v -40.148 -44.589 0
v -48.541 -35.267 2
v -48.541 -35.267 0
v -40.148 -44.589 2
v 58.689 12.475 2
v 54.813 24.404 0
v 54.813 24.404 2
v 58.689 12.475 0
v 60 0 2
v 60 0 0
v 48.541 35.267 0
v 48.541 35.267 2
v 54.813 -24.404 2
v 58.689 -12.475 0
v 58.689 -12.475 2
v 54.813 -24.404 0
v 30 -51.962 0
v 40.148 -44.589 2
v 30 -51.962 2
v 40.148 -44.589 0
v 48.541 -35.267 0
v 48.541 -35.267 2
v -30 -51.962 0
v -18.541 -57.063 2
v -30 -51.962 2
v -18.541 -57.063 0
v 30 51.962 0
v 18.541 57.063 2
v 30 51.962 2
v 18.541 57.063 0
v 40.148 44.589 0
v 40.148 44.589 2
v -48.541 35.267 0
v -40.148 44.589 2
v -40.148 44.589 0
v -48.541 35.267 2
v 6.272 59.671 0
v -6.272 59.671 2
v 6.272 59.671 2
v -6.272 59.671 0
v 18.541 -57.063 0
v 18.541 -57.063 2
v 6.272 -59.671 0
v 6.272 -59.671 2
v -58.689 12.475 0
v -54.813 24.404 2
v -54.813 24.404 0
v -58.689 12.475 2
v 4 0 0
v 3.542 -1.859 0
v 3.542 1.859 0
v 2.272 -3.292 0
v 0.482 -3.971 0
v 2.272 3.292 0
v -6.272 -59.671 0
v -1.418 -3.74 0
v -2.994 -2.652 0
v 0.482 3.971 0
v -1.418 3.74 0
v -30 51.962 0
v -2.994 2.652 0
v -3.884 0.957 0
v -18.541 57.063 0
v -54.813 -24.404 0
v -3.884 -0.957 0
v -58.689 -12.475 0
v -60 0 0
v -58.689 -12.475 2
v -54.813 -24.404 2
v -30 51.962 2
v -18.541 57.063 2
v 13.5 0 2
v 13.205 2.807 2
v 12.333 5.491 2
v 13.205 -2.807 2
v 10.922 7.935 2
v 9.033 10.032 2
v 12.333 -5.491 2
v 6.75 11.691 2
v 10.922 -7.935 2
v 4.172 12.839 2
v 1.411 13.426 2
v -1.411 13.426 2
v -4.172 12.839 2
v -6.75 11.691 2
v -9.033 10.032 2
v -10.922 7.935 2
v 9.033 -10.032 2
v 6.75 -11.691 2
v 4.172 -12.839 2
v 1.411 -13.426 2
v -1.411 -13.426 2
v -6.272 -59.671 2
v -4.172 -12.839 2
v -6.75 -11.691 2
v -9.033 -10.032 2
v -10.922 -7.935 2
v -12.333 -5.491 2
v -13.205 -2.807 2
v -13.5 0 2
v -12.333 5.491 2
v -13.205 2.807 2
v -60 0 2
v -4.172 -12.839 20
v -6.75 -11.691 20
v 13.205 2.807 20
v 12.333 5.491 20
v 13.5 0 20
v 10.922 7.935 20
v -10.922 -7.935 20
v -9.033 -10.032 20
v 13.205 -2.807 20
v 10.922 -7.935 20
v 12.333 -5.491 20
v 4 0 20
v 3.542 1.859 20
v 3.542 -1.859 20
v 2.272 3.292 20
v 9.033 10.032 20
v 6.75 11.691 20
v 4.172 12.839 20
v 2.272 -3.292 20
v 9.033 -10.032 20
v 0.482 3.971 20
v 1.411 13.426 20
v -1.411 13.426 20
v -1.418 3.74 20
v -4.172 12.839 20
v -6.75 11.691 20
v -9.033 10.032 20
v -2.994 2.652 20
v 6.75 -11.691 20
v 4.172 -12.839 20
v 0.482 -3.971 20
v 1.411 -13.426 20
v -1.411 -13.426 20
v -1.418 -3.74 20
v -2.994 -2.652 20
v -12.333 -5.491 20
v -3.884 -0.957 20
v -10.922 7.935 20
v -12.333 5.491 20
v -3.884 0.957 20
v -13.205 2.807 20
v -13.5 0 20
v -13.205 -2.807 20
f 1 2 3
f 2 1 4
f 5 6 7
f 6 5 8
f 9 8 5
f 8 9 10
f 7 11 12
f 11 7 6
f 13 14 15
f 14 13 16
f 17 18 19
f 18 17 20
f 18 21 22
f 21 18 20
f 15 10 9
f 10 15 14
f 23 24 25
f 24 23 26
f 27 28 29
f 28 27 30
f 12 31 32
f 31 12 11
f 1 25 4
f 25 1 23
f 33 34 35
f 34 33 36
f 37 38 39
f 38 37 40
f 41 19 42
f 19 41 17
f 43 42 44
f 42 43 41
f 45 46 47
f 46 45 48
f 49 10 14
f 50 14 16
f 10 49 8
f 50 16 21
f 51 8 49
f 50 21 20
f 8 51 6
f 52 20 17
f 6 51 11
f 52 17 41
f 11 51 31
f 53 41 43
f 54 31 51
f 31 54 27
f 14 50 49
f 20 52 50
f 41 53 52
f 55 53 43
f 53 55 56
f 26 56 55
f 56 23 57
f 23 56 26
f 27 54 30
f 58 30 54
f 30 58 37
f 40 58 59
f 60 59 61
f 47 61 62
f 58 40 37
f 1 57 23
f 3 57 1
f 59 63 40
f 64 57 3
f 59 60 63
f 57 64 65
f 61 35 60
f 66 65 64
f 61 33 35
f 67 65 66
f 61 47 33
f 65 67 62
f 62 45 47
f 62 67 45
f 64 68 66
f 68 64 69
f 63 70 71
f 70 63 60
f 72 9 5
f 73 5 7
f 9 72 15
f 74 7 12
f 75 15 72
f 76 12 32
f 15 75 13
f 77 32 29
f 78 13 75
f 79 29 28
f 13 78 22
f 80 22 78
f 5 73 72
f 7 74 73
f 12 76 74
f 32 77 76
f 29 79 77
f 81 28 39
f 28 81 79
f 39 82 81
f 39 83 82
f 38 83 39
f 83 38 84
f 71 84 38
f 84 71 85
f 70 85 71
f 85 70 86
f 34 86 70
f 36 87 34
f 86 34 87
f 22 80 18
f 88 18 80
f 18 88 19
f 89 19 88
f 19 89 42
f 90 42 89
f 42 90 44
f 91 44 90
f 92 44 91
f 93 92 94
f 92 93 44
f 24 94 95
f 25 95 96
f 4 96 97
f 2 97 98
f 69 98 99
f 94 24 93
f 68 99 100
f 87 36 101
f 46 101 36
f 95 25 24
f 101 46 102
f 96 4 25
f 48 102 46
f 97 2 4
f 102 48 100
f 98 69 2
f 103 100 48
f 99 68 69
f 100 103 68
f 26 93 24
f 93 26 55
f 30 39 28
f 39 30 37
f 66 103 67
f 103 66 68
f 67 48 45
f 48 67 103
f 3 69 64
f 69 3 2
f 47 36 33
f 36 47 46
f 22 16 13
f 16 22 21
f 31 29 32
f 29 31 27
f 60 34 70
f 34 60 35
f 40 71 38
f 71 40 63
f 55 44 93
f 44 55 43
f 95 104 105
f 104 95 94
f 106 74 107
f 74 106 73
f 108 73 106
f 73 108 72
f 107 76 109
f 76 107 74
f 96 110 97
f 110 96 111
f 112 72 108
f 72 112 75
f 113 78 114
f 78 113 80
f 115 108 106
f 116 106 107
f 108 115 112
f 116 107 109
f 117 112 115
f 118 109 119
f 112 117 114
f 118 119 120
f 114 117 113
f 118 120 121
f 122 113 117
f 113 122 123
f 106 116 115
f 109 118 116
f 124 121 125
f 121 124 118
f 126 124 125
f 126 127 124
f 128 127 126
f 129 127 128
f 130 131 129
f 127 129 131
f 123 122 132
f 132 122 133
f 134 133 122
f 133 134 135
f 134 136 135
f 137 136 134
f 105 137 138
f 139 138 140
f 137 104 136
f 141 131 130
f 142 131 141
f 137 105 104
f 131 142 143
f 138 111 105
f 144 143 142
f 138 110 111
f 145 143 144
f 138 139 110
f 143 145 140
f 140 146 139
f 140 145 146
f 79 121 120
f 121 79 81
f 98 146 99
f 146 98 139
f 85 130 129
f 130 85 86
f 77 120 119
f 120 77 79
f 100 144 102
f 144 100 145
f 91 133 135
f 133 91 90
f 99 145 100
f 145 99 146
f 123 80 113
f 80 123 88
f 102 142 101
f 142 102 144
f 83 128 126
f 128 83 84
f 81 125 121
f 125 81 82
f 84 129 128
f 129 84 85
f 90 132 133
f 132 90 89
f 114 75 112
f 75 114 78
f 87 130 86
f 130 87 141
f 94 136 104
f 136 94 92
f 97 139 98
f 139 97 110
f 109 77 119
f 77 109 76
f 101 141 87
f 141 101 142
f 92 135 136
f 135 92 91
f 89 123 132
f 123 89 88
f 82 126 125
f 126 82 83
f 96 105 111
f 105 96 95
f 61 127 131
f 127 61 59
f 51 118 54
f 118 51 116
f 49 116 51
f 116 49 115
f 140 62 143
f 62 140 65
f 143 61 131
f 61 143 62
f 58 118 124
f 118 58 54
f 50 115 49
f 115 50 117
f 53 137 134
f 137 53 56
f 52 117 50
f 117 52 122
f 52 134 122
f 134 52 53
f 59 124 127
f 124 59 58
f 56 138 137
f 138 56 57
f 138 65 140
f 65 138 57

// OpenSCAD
// globals
co_radius = 60;
co_height = 2;

module complexObject()
{
	difference()
	{
		union()
		{
			cylinder(r=co_radius, h=co_height);
			cylinder(r=13.5, h=20);
			{

			}
		}
		
		difference()
		{
			cylinder(r=4, h=20);
			{

			}
		}
	}
}



complexObject();
